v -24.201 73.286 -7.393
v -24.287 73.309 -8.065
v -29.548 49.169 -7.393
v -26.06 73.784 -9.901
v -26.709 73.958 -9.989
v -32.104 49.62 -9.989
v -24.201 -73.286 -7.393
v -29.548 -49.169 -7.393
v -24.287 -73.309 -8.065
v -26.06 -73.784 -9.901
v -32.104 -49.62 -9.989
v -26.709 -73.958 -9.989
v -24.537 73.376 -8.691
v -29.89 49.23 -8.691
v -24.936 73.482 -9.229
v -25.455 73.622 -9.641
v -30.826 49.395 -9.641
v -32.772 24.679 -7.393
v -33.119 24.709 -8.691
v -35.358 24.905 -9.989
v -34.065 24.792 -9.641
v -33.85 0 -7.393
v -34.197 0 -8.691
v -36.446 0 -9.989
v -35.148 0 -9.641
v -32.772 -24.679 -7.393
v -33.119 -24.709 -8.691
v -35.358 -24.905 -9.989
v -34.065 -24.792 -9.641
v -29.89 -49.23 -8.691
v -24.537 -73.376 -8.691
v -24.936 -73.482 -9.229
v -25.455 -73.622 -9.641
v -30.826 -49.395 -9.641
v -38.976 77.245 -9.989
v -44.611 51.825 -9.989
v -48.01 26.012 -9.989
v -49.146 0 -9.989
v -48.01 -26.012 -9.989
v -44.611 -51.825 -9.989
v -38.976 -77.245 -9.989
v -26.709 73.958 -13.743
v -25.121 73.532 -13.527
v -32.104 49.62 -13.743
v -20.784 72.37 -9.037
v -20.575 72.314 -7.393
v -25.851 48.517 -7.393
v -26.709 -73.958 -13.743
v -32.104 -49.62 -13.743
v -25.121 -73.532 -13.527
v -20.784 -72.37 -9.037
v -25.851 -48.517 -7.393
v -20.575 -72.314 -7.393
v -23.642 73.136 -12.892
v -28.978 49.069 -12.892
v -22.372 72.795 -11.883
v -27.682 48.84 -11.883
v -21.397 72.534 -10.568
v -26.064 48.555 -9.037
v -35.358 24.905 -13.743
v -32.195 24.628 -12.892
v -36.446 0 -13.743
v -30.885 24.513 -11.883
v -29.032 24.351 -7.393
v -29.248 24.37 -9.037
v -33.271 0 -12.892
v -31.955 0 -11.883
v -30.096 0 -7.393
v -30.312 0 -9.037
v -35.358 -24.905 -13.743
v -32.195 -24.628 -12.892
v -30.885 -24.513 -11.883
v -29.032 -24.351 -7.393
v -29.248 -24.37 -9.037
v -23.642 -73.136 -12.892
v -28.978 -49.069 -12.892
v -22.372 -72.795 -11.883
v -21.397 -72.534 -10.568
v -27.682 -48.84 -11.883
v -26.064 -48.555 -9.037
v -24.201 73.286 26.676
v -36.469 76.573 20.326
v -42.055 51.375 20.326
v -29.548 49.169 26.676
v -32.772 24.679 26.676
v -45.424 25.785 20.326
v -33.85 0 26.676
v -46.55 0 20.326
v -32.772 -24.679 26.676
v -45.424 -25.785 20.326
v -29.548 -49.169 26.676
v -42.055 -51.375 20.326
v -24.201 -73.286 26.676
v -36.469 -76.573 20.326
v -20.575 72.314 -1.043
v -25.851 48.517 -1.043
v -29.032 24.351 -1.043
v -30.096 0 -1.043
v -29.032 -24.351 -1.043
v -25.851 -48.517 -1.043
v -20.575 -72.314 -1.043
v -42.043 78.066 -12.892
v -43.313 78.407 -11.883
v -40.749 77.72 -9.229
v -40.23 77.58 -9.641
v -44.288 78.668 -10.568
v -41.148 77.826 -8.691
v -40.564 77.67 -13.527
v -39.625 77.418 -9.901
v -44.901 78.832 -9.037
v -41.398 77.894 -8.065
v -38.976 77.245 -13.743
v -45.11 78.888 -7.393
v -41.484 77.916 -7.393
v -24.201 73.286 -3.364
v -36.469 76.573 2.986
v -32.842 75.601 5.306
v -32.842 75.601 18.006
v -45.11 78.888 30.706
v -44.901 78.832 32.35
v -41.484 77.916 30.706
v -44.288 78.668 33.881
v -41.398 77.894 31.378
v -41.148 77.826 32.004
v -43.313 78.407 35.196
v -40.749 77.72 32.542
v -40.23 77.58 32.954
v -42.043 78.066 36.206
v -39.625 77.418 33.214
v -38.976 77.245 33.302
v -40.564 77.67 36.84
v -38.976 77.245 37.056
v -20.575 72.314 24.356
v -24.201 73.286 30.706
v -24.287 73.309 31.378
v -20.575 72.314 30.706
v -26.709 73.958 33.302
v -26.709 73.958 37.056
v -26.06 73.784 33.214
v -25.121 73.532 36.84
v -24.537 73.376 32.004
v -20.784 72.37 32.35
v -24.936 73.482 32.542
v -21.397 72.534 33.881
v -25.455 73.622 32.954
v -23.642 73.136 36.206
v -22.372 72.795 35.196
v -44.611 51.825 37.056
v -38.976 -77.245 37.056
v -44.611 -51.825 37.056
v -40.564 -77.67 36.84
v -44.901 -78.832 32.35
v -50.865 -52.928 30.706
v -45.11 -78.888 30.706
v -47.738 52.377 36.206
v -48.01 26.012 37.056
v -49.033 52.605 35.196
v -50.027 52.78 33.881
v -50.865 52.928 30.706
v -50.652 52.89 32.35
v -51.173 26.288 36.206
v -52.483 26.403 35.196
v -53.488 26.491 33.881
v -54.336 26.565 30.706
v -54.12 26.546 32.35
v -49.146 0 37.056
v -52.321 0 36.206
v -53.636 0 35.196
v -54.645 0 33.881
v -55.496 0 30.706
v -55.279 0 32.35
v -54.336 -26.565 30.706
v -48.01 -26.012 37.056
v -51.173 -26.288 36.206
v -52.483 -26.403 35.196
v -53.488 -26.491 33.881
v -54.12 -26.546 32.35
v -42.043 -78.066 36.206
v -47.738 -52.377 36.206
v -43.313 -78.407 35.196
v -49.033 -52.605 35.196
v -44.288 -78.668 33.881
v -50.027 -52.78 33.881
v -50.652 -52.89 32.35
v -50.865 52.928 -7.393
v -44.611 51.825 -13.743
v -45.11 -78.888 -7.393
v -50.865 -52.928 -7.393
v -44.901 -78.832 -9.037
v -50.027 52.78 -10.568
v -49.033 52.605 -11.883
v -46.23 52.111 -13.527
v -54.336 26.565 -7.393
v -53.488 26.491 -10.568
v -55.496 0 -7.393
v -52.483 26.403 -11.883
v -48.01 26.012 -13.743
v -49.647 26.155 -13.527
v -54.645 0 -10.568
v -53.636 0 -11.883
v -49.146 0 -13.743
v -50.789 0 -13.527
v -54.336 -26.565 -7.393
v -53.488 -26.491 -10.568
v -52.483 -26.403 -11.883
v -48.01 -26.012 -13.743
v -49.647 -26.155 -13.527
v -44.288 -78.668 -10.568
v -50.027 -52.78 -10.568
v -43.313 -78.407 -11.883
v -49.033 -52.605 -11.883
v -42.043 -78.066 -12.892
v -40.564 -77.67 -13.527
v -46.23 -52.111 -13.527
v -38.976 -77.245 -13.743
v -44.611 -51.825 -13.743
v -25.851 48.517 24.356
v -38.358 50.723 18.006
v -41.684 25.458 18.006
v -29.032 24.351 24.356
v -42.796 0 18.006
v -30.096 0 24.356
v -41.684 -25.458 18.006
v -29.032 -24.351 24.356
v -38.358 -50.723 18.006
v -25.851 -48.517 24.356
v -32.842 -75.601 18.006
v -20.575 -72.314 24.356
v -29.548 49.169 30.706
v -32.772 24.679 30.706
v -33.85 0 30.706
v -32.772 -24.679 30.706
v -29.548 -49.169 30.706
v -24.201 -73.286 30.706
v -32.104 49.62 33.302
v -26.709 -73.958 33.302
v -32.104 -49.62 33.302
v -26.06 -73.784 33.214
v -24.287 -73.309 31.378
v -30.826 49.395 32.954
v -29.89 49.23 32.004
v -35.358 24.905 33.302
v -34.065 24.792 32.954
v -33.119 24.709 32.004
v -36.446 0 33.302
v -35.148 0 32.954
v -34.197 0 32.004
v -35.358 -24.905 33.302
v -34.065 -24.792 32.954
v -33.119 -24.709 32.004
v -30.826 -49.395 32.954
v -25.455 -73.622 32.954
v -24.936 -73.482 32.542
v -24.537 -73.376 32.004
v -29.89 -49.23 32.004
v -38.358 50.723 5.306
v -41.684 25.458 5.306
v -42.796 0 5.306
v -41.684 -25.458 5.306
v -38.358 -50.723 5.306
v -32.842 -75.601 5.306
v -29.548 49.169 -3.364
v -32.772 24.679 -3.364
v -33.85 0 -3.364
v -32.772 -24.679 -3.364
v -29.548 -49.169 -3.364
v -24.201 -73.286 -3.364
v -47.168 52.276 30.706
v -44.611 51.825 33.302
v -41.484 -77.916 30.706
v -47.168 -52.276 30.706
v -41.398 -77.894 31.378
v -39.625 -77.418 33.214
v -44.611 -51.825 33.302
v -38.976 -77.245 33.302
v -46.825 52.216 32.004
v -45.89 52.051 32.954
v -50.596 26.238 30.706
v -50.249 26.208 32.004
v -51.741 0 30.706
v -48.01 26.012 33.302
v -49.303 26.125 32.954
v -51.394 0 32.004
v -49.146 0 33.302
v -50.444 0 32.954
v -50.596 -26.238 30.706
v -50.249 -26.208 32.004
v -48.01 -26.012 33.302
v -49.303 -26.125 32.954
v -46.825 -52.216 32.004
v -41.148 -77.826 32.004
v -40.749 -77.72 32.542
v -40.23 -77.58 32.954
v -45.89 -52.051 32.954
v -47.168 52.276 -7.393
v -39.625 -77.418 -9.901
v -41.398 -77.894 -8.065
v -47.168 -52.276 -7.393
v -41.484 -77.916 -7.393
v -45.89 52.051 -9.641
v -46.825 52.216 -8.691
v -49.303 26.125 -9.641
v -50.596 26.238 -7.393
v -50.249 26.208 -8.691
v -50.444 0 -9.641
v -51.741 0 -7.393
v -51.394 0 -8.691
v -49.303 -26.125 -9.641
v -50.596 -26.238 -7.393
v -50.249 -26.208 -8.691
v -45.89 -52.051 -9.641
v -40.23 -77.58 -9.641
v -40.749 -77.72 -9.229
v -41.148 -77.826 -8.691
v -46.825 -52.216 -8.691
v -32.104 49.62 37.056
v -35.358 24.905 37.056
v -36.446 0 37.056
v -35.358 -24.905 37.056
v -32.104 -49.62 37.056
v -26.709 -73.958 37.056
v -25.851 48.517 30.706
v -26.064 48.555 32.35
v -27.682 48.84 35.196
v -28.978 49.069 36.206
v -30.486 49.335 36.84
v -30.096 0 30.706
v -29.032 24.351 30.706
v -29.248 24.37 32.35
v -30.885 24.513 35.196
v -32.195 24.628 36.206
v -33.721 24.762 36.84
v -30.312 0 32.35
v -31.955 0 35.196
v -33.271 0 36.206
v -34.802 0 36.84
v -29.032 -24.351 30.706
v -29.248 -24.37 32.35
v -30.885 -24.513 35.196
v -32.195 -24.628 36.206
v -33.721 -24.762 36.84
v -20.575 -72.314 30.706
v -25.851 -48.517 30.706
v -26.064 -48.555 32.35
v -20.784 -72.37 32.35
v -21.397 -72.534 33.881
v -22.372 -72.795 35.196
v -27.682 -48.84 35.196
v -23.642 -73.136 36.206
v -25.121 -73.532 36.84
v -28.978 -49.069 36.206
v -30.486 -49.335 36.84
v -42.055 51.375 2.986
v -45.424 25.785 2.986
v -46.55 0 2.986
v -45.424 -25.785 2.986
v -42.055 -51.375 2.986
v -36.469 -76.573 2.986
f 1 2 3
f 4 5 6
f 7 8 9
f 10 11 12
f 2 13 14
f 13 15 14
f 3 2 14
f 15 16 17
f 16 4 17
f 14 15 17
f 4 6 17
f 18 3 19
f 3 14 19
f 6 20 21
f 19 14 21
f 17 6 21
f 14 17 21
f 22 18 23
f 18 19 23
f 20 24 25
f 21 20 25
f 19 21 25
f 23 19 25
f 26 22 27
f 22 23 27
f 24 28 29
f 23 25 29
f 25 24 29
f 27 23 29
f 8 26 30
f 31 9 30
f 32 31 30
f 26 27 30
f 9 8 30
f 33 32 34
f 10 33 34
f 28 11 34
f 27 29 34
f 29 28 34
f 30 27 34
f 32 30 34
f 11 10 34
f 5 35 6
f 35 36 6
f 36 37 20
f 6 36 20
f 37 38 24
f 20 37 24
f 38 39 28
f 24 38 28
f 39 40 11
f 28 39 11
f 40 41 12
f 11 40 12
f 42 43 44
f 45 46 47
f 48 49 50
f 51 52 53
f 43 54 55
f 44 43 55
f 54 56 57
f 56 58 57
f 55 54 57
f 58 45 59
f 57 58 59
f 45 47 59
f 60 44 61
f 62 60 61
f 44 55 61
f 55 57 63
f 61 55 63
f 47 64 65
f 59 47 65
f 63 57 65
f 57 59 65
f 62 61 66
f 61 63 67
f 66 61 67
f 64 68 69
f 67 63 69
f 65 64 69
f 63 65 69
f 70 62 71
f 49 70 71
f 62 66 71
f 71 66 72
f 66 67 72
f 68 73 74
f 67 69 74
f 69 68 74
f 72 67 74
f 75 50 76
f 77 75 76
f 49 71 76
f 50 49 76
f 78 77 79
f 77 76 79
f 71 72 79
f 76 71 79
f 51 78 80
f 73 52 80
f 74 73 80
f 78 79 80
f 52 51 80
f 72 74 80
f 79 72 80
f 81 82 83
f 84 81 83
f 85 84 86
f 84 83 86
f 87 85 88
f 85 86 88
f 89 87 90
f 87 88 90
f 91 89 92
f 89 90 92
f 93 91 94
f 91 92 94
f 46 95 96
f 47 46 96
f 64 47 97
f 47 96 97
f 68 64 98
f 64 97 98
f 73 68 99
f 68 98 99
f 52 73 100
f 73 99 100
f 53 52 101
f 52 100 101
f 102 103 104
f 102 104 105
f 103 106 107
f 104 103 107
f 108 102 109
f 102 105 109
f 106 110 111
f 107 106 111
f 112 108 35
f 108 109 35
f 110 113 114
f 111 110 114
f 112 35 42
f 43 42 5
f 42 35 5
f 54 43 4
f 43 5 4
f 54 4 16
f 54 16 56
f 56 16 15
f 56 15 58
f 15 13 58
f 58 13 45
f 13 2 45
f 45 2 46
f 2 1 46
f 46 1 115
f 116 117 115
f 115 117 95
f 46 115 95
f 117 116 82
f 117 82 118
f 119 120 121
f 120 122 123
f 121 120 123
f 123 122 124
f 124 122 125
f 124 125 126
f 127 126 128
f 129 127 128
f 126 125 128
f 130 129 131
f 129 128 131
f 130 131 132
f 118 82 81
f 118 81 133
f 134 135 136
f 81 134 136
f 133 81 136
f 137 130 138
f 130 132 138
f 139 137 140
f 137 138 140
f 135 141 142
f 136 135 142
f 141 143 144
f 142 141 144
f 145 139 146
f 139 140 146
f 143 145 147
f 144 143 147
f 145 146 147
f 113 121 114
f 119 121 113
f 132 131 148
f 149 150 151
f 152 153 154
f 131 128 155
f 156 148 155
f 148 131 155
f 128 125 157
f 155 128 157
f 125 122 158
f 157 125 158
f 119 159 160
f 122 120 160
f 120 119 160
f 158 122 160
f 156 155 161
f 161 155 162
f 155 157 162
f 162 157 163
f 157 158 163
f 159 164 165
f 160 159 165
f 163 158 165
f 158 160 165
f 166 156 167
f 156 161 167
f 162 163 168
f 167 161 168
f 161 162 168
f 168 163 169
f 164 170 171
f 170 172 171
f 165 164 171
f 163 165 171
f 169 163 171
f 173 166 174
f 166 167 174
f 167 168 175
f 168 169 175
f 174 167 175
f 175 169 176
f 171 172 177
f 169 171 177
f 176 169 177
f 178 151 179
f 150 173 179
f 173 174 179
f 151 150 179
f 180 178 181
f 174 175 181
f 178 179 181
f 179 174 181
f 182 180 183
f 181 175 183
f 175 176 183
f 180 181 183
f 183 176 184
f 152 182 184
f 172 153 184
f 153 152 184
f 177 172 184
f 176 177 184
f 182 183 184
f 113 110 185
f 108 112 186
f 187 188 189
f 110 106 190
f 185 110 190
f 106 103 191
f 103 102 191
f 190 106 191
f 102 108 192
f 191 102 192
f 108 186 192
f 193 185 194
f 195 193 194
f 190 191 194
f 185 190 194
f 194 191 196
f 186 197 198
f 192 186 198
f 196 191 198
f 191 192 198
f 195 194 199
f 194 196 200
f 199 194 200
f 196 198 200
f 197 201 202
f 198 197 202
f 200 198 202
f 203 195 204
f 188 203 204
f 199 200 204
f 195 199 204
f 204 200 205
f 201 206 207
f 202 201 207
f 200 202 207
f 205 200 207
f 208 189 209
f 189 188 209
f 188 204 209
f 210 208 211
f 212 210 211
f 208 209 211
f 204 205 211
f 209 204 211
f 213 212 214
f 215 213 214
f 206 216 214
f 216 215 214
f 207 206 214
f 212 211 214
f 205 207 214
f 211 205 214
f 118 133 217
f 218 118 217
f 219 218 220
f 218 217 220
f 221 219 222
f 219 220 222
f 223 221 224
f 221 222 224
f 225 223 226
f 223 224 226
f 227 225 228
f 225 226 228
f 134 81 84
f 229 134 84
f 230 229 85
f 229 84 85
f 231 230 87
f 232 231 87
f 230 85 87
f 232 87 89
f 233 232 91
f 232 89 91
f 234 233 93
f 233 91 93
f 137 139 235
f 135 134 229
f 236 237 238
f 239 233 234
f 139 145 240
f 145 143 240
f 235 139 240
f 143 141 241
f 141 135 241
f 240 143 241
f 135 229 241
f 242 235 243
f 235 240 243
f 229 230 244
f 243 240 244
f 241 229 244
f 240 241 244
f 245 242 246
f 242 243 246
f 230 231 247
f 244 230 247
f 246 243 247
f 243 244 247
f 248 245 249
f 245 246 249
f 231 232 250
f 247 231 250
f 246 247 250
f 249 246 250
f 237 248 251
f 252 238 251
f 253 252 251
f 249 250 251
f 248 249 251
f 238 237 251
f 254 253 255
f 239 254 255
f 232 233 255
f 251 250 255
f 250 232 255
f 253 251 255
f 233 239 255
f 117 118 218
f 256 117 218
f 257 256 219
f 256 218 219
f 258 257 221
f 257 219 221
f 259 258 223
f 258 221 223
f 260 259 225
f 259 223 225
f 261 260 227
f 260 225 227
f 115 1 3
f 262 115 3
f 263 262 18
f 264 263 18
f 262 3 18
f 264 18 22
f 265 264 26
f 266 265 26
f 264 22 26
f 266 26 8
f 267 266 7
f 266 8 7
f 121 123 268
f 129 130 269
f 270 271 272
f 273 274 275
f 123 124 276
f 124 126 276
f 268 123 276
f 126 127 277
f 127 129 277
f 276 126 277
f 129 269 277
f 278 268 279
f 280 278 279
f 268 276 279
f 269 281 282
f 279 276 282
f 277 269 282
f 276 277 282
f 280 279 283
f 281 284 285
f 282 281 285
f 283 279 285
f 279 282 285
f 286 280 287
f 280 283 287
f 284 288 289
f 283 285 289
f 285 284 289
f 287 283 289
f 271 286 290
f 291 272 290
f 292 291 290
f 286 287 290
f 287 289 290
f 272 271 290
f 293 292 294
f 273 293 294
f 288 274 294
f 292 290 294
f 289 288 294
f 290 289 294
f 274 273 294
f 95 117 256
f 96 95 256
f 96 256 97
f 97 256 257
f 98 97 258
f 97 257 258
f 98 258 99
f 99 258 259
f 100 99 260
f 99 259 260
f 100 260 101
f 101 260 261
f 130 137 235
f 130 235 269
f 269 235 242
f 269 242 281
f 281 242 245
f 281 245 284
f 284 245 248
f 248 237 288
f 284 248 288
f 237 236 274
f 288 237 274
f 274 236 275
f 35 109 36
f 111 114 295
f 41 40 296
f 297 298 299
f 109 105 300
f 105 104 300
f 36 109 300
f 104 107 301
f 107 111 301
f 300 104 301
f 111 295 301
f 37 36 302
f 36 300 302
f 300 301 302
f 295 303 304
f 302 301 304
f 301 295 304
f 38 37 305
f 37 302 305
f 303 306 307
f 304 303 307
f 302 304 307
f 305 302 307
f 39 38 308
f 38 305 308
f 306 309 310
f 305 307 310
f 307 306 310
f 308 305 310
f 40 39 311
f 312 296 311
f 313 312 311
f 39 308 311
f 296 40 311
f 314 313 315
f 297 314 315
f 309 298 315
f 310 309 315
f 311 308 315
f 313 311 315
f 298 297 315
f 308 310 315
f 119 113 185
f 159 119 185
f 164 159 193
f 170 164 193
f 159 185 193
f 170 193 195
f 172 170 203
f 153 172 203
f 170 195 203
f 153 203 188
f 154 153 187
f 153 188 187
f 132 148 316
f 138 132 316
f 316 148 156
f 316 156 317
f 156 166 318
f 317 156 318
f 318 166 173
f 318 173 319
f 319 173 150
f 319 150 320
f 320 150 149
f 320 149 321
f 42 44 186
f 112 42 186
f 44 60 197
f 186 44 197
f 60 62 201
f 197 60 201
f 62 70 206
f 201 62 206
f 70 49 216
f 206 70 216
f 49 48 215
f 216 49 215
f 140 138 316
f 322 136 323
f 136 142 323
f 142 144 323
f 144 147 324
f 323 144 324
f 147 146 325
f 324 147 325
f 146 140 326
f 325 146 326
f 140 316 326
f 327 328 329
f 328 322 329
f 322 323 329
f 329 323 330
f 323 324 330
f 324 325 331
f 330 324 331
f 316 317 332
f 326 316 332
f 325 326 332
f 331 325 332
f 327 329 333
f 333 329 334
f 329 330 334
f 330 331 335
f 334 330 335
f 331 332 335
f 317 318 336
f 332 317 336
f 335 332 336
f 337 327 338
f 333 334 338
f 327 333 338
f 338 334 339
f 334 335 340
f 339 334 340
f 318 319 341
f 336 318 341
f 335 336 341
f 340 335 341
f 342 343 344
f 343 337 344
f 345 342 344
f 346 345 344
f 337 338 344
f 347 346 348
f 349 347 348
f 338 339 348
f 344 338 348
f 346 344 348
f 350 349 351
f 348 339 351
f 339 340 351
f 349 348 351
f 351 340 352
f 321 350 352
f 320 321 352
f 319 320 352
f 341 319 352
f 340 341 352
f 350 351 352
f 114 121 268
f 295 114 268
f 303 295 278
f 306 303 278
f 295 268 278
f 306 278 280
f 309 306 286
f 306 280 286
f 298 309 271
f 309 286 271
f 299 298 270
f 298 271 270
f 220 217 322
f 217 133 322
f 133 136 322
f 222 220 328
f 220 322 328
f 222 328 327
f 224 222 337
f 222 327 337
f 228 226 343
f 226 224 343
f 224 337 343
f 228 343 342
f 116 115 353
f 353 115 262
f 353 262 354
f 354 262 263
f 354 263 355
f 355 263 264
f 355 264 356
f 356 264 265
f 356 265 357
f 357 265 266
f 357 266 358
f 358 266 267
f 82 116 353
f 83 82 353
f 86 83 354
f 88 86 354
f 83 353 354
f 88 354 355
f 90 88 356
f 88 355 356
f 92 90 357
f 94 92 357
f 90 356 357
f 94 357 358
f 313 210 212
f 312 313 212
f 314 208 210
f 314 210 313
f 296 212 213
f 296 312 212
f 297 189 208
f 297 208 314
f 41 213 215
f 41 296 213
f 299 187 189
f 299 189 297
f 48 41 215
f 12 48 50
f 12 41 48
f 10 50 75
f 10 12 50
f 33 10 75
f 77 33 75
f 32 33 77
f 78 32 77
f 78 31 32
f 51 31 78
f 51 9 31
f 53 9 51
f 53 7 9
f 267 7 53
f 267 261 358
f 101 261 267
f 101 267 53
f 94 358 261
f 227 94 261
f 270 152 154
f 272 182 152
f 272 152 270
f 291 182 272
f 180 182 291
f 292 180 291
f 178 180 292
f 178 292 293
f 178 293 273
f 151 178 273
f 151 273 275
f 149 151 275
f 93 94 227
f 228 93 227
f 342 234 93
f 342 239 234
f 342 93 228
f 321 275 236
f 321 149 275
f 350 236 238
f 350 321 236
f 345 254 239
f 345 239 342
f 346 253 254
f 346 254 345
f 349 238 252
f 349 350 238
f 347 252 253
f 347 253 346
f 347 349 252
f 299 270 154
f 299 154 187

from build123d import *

# Parameters (mm, degrees)
F1_ANGLE = 30
F3_ANGLE = 3


with BuildPart() as f1:
    # F0 (on Front) → F1 (revolve, symmetric)
    with BuildSketch(Plane.XZ) as f1_sk:
        with BuildLine():
            Line((-36.445543, 37.056317), (-49.145543, 37.056317))
            ThreePointArc((-49.145543, 37.056317), (-53.635671, 35.196445), (-55.495543, 30.706317))
            Line((-55.495543, 30.706317), (-55.495543, -7.393194))
            ThreePointArc((-55.495543, -7.393194), (-53.635671, -11.883322), (-49.145543, -13.743194))
            Line((-49.145543, -13.743194), (-36.445543, -13.743194))
            ThreePointArc((-36.445543, -13.743194), (-31.955415, -11.883322), (-30.095543, -7.393194))
            Line((-30.095543, -7.393194), (-30.095543, -1.043439))
            Line((-30.095543, -1.043439), (-42.795543, 5.306317))
            Line((-42.795543, 5.306317), (-42.795543, 18.006317))
            Line((-42.795543, 18.006317), (-30.095543, 24.356317))
            Line((-30.095543, 24.356317), (-30.095543, 30.706317))
            ThreePointArc((-30.095543, 30.706317), (-31.955415, 35.196445), (-36.445543, 37.056317))
        make_face()
    revolve(axis=Axis((249.304457, 0, 5.828281), (0, 0, -1)), revolution_arc=F1_ANGLE / 2)
    revolve(f1_sk.sketch, axis=Axis((249.304457, 0, 5.828281), (0, 0, 1)), revolution_arc=F1_ANGLE / 2)

    # F2 (on face) → F3 (revolve)
    with BuildSketch(Plane(origin=(16.700232, -62.326114, 0), x_dir=(0.965926, 0.258819, 0), z_dir=(0.258819, -0.965926, 0))):
        with BuildLine():
            Line((-42.402958, 26.712616), (-42.402958, 30.706317))
            ThreePointArc((-42.402958, 30.706317), (-43.146153, 32.50055), (-44.940386, 33.243746))
            Line((-44.940386, 33.243746), (-57.640386, 33.243746))
            ThreePointArc((-57.640386, 33.243746), (-59.434619, 32.50055), (-60.177815, 30.706317))
            Line((-60.177815, 30.706317), (-60.177815, -7.393194))
            ThreePointArc((-60.177815, -7.393194), (-59.434619, -9.187427), (-57.640386, -9.930623))
            Line((-57.640386, -9.930623), (-44.940386, -9.930623))
            ThreePointArc((-44.940386, -9.930623), (-43.146153, -9.187427), (-42.402958, -7.393194))
            Line((-42.402958, -7.393194), (-42.402958, -3.399778))
            Line((-42.402958, -3.399778), (-55.102958, 2.949978))
            Line((-55.102958, 2.949978), (-55.102958, 20.362616))
            Line((-55.102958, 20.362616), (-42.402958, 26.712616))
        make_face()
    revolve(axis=Axis((249.304457, 0, 17.638403), (0, 0, 1)), revolution_arc=F3_ANGLE)

    # F4 (on face) → F5 (revolve, cut)
    with BuildSketch(Plane(origin=(16.700232, 62.326114, 0), x_dir=(-0.965926, 0.258819, 0), z_dir=(0.258819, 0.965926, 0))):
        with BuildLine():
            Line((60.236317, -7.393194), (60.236317, 30.706317))
            ThreePointArc((60.236317, 30.706317), (59.475986, 32.541917), (57.640386, 33.302248))
            Line((57.640386, 33.302248), (44.940386, 33.302248))
            ThreePointArc((44.940386, 33.302248), (43.104786, 32.541917), (42.344456, 30.706317))
            Line((42.344456, 30.706317), (42.344456, 26.67646))
            Line((42.344456, 26.67646), (55.044456, 20.32646))
            Line((55.044456, 20.32646), (55.044456, 2.986135))
            Line((55.044456, 2.986135), (42.344456, -3.363621))
            Line((42.344456, -3.363621), (42.344456, -7.393194))
            ThreePointArc((42.344456, -7.393194), (43.104786, -9.228794), (44.940386, -9.989125))
            Line((44.940386, -9.989125), (57.640386, -9.989125))
            ThreePointArc((57.640386, -9.989125), (59.475986, -9.228794), (60.236317, -7.393194))
        make_face()
    revolve(axis=Axis((249.304457, 0, 18.53192), (0, 0, 1)), mode=Mode.SUBTRACT)


solid = f1.part
